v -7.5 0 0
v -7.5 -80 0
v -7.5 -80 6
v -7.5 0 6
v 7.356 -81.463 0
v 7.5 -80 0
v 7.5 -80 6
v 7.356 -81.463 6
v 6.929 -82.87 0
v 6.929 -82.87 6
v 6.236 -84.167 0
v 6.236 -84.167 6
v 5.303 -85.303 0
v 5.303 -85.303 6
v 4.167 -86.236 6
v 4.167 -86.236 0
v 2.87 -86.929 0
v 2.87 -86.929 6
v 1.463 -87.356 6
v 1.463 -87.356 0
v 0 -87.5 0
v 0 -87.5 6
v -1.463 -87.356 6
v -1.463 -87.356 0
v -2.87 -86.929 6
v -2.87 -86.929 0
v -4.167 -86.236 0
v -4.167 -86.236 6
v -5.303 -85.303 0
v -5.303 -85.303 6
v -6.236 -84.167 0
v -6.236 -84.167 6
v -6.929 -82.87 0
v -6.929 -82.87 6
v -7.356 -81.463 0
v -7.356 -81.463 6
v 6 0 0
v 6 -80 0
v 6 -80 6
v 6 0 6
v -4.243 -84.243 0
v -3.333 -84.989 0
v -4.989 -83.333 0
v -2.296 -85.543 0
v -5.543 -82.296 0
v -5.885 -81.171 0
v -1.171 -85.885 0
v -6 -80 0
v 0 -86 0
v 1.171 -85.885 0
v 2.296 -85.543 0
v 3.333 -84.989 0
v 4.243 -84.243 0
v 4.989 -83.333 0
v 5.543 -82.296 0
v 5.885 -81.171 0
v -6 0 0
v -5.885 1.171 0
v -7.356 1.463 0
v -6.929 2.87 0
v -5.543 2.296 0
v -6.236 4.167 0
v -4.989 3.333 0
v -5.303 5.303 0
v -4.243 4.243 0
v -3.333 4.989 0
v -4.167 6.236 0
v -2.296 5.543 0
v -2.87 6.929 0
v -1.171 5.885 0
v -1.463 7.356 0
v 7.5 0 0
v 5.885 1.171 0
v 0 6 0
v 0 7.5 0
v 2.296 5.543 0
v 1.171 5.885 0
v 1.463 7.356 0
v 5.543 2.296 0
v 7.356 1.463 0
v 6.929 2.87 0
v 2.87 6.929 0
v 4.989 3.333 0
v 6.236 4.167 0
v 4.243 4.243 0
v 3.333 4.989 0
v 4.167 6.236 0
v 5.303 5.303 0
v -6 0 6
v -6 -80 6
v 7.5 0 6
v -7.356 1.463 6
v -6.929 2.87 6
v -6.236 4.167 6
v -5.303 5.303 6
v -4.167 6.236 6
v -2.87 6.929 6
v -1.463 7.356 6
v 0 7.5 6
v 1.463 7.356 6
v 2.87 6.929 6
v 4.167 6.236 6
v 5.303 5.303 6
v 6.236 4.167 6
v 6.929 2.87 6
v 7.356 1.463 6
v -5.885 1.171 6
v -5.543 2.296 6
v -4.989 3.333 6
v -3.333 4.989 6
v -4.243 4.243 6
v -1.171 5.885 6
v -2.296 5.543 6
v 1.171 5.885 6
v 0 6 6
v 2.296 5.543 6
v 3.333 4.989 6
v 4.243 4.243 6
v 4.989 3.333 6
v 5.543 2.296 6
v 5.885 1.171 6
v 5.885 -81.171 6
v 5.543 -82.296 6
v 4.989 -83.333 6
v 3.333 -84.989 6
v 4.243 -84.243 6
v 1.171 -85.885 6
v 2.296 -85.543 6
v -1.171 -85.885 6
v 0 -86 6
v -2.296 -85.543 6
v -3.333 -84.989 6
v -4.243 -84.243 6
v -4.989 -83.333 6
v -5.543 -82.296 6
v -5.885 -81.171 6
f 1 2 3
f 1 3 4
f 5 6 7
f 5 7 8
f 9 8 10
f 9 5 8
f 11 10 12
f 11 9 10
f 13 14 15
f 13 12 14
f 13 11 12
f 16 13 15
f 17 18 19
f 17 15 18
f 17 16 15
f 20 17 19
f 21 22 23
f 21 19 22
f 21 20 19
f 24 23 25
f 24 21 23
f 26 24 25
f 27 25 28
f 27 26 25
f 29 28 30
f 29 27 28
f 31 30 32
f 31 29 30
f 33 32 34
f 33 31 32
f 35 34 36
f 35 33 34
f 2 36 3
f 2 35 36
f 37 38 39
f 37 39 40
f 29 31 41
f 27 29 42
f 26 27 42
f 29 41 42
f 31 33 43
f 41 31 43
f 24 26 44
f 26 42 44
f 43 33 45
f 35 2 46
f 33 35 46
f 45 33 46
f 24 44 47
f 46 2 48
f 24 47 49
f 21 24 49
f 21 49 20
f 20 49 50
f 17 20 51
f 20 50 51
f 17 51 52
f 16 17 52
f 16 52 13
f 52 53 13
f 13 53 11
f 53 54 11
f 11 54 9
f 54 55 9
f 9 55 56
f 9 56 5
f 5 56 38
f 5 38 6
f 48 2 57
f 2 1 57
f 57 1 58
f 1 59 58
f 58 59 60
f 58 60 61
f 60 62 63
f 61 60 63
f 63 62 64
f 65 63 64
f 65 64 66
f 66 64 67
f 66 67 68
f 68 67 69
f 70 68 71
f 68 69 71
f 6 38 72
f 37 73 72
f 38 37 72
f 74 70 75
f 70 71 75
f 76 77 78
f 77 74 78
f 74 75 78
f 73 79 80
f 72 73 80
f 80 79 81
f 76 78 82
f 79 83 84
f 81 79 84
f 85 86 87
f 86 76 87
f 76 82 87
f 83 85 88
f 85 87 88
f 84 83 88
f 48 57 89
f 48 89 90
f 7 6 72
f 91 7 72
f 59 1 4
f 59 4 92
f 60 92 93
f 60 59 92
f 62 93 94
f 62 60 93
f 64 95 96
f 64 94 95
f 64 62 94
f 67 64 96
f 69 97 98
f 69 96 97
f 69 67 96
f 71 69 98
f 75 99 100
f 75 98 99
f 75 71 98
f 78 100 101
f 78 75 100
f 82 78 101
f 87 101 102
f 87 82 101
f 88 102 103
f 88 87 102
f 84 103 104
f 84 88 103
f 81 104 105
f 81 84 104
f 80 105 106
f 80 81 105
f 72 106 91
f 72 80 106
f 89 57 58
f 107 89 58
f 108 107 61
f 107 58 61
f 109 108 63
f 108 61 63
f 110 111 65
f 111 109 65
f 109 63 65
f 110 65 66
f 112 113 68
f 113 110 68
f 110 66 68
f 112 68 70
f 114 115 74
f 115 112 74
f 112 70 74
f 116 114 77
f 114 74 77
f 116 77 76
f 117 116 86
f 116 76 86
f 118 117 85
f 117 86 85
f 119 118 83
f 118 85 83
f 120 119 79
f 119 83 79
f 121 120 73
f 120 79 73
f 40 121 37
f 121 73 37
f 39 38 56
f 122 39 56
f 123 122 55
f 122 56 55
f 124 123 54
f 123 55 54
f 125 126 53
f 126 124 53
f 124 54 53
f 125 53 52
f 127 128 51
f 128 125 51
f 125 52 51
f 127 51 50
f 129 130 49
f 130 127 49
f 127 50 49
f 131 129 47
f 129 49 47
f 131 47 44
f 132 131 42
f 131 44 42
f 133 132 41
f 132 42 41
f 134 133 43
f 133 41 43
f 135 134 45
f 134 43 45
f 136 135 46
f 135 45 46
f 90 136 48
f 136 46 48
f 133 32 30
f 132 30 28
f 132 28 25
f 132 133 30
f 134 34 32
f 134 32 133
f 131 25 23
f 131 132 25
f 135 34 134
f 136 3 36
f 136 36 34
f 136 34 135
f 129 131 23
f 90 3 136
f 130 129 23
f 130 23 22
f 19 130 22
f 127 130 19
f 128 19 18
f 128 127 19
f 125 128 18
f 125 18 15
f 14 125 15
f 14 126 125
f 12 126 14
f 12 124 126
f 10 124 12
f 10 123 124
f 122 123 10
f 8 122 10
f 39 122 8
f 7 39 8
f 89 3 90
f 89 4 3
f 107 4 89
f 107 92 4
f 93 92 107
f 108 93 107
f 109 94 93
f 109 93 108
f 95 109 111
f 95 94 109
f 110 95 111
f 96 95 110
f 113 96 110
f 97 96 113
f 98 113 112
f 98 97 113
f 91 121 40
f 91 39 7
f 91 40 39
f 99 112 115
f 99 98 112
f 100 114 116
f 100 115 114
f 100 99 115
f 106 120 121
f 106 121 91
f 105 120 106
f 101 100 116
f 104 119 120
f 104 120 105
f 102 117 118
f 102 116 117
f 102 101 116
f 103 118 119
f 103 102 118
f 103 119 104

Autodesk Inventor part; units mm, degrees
ref_plane "YZ Plane" through (0, 0, 0) normal (1, 0, 0) x (0, 1, 0)
ref_plane "XZ Plane" through (0, 0, 0) normal (0, 1, 0) x (-1, 0, 0)
ref_plane "XY Plane" through (0, 0, 0) normal (0, 0, 1) x (1, 0, 0)
sketch "Skizze1" plane through (0, 0, 0) normal (0, 0, 1) x (1, 0, 0)
  arc A0 (6, 0) -> (-6, 0) centre (0, 0) ccw
  arc A1 (7.5, 0) -> (-7.5, 0) centre (0, 0) ccw
  arc A2 (-6, -80) -> (6, -80) centre (0, -80) ccw
  line L0 (0, -80) -> (6, -80) construction
  line L1 (0, -80) -> (-6, -80) construction
  arc A3 (-7.5, -80) -> (7.5, -80) centre (0, -80) ccw
  line L2 (0, -80) -> (7.5, -80) construction
  line L3 (0, -80) -> (-7.5, -80) construction
  line L4 (-7.5, -80) -> (-7.5, 0)
  line L5 (-6, 0) -> (-6, -80)
  line L6 (6, -80) -> (6, 0)
  line L7 (7.5, -80) -> (7.5, 0)
  dimension "d0" = 6
  dimension "d1" = 7.5
  dimension "d2" = 6
  dimension "d3" = 180
  dimension "d4" = 7.5
  dimension "d5" = 180
  dimension "d6" = 80
  dimension "d7" = 0
extrude "Extrusion1" add sketch "Skizze1" along normal blind 6
properties part number "Y belt" material "Gummi, Silikon"
